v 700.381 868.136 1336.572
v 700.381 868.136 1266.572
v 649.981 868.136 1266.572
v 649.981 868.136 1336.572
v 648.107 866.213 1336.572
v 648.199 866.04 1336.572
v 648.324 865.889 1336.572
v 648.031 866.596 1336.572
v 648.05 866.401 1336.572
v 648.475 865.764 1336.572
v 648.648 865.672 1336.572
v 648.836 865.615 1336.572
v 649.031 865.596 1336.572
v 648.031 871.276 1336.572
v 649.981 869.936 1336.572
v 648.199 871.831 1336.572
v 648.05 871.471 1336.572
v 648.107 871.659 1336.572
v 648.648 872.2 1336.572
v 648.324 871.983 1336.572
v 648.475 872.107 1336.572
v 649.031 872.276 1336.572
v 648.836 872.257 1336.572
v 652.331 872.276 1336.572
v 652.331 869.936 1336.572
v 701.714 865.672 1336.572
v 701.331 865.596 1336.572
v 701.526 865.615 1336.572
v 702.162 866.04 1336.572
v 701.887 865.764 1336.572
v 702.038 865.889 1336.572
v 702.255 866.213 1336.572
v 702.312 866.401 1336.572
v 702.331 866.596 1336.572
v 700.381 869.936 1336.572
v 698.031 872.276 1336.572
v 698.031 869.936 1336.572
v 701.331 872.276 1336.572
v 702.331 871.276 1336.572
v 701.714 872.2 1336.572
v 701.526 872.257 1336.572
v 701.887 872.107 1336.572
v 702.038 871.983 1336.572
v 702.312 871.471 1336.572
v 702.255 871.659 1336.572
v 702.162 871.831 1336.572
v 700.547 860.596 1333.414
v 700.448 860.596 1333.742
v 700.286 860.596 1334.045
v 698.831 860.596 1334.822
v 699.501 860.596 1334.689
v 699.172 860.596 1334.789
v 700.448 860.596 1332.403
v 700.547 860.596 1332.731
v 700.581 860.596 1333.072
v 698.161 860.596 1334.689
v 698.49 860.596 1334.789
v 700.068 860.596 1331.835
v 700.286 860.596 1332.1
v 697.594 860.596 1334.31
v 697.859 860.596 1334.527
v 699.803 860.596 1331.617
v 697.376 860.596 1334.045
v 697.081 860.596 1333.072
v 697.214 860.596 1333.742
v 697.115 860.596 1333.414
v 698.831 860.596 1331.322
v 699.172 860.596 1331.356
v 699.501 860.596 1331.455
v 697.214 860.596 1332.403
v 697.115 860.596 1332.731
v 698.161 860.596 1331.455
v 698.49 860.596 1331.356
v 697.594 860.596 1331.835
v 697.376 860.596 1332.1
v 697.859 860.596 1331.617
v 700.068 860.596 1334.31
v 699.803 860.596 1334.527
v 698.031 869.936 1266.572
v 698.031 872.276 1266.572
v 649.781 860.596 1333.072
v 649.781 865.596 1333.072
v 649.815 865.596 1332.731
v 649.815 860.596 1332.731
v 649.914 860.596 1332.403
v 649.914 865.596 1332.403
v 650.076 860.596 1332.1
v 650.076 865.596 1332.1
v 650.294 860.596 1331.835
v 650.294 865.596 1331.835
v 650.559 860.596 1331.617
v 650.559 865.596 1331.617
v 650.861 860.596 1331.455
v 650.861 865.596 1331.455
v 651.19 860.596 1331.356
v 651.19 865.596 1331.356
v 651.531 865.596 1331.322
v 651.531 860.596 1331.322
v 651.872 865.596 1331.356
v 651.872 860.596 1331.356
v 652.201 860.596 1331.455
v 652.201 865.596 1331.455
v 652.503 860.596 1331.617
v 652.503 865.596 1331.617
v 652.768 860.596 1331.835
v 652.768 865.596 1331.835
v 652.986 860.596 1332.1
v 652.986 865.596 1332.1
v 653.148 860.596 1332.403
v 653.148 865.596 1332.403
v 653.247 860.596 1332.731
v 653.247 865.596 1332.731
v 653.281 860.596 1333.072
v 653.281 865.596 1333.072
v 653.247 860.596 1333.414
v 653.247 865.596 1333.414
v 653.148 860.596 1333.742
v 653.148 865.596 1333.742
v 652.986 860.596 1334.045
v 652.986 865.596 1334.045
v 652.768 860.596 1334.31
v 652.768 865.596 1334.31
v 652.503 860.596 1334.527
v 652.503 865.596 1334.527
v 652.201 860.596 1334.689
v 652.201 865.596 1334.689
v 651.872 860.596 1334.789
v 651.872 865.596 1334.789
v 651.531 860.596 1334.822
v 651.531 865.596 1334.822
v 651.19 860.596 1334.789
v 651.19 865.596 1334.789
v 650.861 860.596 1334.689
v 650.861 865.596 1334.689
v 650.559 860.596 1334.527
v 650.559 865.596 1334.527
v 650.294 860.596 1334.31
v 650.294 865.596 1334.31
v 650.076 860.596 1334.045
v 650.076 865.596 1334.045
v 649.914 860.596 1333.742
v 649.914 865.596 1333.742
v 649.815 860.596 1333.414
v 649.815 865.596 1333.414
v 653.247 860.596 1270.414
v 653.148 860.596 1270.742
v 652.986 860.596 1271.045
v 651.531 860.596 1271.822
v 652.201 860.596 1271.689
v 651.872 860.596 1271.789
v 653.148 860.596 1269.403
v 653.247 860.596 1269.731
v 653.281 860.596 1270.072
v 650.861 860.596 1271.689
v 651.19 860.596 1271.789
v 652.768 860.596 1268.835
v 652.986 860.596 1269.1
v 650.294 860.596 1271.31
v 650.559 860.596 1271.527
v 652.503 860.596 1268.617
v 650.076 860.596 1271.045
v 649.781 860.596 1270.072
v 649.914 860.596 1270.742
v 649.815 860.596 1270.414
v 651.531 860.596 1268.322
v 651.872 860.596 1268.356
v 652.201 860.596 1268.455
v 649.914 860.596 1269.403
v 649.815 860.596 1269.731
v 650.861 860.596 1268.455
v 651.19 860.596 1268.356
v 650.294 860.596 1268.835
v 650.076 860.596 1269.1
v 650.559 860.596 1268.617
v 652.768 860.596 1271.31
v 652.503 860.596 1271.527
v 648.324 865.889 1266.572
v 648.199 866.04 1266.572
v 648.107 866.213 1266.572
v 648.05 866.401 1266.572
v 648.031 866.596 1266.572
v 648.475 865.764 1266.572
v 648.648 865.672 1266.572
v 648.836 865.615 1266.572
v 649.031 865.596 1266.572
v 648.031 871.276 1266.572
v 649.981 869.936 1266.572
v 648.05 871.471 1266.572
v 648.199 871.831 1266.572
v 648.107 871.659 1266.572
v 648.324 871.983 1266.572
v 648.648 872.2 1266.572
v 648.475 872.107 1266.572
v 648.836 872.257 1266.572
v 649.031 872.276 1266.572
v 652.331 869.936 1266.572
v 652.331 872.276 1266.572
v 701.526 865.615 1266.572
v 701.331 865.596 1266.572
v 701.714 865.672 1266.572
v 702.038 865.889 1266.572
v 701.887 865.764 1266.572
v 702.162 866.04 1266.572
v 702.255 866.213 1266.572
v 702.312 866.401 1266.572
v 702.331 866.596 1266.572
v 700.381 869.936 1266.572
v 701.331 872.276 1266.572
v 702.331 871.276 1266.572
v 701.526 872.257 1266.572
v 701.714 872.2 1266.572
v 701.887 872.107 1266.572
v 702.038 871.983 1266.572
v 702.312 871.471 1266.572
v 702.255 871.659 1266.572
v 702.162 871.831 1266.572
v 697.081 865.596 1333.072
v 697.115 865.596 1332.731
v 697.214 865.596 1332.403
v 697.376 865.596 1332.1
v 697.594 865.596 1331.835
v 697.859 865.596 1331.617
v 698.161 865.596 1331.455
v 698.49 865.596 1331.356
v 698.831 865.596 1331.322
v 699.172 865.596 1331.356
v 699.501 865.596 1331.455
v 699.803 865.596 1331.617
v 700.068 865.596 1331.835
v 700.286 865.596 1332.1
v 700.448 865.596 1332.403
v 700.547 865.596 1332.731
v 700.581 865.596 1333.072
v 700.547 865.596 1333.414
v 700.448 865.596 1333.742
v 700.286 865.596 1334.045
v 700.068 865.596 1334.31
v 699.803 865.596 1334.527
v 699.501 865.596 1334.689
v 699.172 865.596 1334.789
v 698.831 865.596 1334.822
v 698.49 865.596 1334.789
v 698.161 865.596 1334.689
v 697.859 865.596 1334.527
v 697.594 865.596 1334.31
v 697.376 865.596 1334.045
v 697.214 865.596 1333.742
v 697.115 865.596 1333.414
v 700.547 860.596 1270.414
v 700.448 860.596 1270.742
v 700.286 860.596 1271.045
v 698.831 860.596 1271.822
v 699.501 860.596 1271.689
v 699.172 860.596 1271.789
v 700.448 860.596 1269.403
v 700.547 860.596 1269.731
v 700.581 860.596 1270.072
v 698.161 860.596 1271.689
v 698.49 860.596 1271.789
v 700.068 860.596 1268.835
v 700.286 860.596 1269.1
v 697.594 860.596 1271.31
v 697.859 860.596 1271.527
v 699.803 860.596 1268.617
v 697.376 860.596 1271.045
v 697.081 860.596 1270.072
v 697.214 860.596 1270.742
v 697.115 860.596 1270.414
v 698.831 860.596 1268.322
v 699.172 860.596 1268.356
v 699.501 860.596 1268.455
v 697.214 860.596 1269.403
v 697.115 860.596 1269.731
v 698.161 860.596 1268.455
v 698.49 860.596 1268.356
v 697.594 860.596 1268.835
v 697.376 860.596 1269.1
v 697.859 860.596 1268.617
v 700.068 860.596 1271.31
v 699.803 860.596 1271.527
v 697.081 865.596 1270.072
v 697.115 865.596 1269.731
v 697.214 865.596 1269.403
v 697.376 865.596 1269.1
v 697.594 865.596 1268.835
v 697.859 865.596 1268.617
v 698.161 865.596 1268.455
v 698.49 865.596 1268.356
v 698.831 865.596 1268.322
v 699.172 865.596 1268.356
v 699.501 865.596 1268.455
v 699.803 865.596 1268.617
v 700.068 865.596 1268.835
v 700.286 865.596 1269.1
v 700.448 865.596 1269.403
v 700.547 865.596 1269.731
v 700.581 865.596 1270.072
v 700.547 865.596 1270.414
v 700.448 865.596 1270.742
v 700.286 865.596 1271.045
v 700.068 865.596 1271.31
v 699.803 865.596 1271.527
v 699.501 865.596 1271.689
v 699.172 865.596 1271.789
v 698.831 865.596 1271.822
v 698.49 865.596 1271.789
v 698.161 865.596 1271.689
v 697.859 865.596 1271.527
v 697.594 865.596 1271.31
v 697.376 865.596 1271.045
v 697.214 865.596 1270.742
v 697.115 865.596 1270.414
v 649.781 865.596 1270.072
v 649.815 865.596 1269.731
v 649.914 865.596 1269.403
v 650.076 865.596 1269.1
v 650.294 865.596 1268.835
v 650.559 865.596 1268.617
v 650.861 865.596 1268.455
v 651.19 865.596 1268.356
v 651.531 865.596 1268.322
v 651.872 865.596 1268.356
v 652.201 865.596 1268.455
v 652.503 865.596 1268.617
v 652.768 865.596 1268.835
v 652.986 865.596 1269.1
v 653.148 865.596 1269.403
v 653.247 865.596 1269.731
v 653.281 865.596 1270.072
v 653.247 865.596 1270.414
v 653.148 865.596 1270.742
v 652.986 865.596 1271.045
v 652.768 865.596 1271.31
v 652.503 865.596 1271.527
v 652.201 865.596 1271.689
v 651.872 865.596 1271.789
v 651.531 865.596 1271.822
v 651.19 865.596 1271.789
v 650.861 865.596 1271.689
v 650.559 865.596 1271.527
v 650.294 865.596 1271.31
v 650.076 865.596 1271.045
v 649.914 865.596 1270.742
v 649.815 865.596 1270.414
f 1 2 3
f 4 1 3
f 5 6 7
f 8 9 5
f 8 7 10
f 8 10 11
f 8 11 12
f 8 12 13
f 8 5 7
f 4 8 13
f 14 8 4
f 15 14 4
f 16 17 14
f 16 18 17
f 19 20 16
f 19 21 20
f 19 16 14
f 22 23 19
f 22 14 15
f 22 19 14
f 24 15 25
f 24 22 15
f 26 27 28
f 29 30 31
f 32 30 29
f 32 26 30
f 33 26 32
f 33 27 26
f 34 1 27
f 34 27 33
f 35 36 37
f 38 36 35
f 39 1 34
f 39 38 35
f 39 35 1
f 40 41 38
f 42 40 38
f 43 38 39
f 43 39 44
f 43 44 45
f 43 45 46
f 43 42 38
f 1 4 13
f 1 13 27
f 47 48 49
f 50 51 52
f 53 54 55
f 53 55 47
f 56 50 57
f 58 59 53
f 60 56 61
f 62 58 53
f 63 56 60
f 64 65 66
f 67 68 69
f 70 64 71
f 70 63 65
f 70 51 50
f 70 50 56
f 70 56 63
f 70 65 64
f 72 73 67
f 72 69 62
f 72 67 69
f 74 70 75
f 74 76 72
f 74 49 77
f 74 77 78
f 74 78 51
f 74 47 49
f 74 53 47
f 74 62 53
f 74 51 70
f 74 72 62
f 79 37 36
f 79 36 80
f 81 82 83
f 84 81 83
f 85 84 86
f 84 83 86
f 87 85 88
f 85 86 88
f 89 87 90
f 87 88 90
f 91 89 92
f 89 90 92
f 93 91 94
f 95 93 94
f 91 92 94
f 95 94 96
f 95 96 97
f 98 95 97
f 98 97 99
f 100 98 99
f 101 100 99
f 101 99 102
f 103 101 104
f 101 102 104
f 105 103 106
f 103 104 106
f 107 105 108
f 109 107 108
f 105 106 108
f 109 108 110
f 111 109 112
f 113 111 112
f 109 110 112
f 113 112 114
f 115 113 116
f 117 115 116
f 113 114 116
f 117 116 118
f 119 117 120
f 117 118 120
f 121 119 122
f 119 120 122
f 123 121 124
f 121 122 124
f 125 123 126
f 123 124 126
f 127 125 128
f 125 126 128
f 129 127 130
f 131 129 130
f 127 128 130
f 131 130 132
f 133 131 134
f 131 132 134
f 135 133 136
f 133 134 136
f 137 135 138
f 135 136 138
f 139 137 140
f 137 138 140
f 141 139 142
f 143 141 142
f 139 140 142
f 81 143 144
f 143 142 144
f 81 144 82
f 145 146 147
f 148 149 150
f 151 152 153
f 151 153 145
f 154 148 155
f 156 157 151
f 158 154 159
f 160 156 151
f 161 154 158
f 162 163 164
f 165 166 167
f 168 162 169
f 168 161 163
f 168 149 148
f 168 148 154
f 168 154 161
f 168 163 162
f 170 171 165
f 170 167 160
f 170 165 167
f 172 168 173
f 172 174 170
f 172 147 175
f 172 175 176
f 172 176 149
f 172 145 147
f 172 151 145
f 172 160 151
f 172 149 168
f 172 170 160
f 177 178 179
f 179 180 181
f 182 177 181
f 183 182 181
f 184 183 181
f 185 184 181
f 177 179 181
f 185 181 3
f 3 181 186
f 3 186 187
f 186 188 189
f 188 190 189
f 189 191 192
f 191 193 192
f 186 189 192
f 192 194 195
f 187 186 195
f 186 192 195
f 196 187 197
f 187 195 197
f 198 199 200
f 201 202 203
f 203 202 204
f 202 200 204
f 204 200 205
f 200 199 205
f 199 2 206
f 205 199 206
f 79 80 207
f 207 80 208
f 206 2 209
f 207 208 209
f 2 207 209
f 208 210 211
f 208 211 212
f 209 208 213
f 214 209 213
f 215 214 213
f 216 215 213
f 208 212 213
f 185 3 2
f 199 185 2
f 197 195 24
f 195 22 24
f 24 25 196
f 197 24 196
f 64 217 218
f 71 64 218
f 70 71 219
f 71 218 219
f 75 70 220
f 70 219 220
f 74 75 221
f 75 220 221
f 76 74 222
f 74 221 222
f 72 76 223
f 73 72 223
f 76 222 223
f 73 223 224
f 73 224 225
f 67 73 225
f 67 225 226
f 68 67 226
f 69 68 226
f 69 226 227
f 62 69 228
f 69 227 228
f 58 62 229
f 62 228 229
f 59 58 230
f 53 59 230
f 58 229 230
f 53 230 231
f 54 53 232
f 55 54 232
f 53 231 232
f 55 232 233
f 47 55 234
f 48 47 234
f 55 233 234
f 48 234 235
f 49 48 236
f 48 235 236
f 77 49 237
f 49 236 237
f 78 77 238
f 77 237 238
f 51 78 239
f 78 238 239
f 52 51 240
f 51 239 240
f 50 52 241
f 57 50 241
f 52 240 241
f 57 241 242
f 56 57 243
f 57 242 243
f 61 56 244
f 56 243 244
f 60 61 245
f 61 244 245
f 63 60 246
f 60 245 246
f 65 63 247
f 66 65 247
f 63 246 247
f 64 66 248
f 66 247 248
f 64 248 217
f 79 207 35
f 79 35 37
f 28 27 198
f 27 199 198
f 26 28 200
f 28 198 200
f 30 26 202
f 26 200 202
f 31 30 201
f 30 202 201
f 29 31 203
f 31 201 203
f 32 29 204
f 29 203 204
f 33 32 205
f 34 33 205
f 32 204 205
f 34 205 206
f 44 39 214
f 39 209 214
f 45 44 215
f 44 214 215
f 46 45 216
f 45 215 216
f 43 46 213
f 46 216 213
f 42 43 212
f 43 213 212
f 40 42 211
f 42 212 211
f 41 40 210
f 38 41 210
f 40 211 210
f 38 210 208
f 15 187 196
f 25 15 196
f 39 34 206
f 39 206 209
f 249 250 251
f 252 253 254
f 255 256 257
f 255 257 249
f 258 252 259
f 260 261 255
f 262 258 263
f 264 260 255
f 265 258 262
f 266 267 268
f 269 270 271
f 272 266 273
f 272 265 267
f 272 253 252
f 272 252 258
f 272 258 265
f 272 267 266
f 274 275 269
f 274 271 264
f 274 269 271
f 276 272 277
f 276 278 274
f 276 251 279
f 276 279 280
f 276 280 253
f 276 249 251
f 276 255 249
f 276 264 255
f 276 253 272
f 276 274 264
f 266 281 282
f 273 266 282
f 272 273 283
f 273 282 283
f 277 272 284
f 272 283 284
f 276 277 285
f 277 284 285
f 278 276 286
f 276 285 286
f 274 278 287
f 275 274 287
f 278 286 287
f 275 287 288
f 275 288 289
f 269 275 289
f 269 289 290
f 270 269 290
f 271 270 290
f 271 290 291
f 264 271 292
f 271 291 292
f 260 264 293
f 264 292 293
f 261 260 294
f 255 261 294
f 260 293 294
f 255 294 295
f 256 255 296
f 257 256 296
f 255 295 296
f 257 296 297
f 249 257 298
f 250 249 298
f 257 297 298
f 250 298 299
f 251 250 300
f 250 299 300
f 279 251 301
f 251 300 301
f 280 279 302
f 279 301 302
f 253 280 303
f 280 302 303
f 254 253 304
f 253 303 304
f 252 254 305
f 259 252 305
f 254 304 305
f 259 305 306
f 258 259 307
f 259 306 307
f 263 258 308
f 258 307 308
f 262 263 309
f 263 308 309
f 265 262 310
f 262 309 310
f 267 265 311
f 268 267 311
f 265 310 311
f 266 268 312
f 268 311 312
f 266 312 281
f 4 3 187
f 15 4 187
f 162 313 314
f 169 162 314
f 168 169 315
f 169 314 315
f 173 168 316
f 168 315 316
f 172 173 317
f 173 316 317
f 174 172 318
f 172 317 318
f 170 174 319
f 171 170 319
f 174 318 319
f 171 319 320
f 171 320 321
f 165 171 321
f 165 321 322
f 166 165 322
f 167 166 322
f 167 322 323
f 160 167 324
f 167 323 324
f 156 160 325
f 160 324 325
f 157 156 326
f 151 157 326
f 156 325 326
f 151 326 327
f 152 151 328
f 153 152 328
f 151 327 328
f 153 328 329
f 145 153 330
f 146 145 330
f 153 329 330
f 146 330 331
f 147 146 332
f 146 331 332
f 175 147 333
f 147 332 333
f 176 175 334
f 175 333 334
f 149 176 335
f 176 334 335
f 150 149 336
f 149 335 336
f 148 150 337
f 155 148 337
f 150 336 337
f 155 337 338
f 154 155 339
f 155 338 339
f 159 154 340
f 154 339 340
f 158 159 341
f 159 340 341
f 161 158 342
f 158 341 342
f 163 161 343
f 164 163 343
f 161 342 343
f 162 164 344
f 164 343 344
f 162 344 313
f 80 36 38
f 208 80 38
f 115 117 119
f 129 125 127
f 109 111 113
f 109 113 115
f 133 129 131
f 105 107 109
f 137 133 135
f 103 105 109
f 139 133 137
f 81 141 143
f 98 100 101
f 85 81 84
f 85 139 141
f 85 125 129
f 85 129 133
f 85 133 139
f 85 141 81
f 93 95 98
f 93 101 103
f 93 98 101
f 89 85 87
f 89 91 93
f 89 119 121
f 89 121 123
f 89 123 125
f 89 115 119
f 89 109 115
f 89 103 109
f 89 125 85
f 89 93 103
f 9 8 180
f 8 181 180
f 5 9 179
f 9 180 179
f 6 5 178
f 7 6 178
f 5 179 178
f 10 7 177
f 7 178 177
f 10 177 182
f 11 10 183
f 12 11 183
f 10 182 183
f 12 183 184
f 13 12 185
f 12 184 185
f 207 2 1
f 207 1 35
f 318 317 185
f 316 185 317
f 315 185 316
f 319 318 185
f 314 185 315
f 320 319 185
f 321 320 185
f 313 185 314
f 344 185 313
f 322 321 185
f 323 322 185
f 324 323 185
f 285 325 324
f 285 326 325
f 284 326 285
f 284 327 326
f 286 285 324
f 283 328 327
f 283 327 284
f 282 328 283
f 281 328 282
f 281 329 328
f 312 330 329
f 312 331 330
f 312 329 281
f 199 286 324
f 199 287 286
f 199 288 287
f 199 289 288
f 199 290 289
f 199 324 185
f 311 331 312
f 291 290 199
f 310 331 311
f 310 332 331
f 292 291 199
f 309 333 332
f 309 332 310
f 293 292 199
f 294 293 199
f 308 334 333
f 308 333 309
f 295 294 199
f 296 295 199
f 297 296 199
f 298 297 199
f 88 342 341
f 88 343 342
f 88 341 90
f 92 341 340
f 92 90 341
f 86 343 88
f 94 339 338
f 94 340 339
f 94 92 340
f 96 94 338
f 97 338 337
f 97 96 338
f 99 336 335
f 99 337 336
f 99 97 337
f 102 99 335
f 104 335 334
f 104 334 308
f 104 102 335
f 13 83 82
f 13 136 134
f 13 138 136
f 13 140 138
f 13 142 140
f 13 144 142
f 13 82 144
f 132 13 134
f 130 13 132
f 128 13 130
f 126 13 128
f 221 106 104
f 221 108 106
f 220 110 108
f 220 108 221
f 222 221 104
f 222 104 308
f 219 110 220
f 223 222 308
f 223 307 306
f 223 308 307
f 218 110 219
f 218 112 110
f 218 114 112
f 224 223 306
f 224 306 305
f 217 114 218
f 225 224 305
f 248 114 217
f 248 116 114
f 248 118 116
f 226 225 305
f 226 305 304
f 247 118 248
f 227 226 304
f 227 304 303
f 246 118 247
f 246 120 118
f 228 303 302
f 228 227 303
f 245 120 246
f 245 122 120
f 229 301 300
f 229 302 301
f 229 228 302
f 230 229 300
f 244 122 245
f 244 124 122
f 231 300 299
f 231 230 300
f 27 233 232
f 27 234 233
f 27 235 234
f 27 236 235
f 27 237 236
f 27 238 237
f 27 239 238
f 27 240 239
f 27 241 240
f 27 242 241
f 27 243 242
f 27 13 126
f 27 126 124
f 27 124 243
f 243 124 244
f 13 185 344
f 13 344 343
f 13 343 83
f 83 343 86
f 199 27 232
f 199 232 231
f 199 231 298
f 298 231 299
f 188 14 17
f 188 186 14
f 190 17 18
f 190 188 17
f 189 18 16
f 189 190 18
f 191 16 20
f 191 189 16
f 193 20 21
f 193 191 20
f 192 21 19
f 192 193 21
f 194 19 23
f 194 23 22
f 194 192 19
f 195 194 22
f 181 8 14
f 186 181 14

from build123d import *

# Parameters (mm, degrees)
SKETCH1_W             = 50
SKETCH1_H             = 70
BOSS_EXTRUDE1_DEPTH   = 2.54
SKETCH2_W             = 2.15
SKETCH2_H             = 70
BOSS_EXTRUDE2_DEPTH   = 2.54
BOSS_EXTRUDE2_2_DEPTH = 2.54
SKETCH4_W             = 2.15
SKETCH4_H             = 6.68
BOSS_EXTRUDE3_DEPTH   = 70
CUT_EXTRUDE1_DEPTH    = 1123.066858808
SKETCH8_R             = 1.75
BOSS_EXTRUDE4_DEPTH   = 5
FILLET4_R             = 1


with BuildPart() as part:
    # Sketch1 → Boss-Extrude1 (new body)
    with BuildSketch(Plane.XZ.offset(-868.135910235)):
        with Locations((675.180956215, 1301.572260588)):
            Rectangle(SKETCH1_W, SKETCH1_H)
    extrude(amount=BOSS_EXTRUDE1_DEPTH)



with BuildPart() as body_2:
    # Sketch2 → Boss-Extrude2 (new body)
    with BuildSketch(Plane(origin=(0, 869.735910235, 0), x_dir=(1, 0, 0), z_dir=(0, 1, 0))):
        with Locations((651.255956215, -1301.572260588)):
            Rectangle(SKETCH2_W, SKETCH2_H)
    extrude(amount=BOSS_EXTRUDE2_DEPTH)


with BuildPart() as body_3:
    # Sketch2 → Boss-Extrude2 2 (new body)
    with BuildSketch(Plane(origin=(0, 869.735910235, 0), x_dir=(1, 0, 0), z_dir=(0, 1, 0))):
        with Locations((699.105956215, -1301.572260588)):
            Rectangle(SKETCH2_W, SKETCH2_H)
    extrude(amount=BOSS_EXTRUDE2_2_DEPTH)


with BuildPart() as part_1:
    add(part.part)

    add(body_2.part)  # Boss-Extrude3 merges body 2

    add(body_3.part)  # Boss-Extrude3 merges body 3
    # Sketch4 → Boss-Extrude3 (add)
    with BuildSketch(Plane.XY.offset(1336.572260588)):
        with Locations((649.105956215, 868.935910235)):
            Rectangle(SKETCH4_W, SKETCH4_H)
        with Locations((701.255956215, 868.935910235)):
            Rectangle(SKETCH4_W, SKETCH4_H)
    extrude(amount=-BOSS_EXTRUDE3_DEPTH)

    # Sketch6 → Cut-Extrude1 (cut, through all)
    with BuildSketch(Plane(origin=(0, 0, 1266.572260588), x_dir=(-1, 0, 0), z_dir=(0, 0, -1))):
        Polygon((-698.030956215, 869.735910235), (-698.030956215, 868.135910235), (-700.380956215, 868.135910235), (-700.380956215, 869.935910235), (-698.030956215, 869.935910235), align=None)
        Polygon((-652.330956215, 869.935910235), (-652.330956215, 869.735910235), (-652.330956215, 868.135910235), (-649.980956215, 868.135910235), (-649.980956215, 869.935910235), align=None)
    extrude(amount=-CUT_EXTRUDE1_DEPTH, mode=Mode.SUBTRACT)

    # Sketch8 → Boss-Extrude4 (add)
    with BuildSketch(Plane.XZ.offset(-865.595910235)):
        with Locations(Location((651.530956215, 1333.072260588, 0), (0, 0, 180))):
            Circle(SKETCH8_R)
        with Locations(Location((698.830956215, 1333.072260588, 0), (0, 0, 180))):
            Circle(SKETCH8_R)
        with Locations(Location((698.830956215, 1270.072260588, 0), (0, 0, 180))):
            Circle(SKETCH8_R)
        with Locations(Location((651.530956215, 1270.072260588, 0), (0, 0, 180))):
            Circle(SKETCH8_R)
    extrude(amount=BOSS_EXTRUDE4_DEPTH)

    # Fillet4
    fillet4_edges = [part_1.edges().sort_by_distance(p)[0] for p in [
        (702.330956215, 865.595910235, 1301.572260588),
        (702.330956215, 872.275910235, 1301.572260588),
        (648.030956215, 865.595910235, 1301.572260588),
        (648.030956215, 872.275910235, 1301.572260588),
    ]]
    fillet(fillet4_edges, radius=FILLET4_R)


solid = part_1.part
